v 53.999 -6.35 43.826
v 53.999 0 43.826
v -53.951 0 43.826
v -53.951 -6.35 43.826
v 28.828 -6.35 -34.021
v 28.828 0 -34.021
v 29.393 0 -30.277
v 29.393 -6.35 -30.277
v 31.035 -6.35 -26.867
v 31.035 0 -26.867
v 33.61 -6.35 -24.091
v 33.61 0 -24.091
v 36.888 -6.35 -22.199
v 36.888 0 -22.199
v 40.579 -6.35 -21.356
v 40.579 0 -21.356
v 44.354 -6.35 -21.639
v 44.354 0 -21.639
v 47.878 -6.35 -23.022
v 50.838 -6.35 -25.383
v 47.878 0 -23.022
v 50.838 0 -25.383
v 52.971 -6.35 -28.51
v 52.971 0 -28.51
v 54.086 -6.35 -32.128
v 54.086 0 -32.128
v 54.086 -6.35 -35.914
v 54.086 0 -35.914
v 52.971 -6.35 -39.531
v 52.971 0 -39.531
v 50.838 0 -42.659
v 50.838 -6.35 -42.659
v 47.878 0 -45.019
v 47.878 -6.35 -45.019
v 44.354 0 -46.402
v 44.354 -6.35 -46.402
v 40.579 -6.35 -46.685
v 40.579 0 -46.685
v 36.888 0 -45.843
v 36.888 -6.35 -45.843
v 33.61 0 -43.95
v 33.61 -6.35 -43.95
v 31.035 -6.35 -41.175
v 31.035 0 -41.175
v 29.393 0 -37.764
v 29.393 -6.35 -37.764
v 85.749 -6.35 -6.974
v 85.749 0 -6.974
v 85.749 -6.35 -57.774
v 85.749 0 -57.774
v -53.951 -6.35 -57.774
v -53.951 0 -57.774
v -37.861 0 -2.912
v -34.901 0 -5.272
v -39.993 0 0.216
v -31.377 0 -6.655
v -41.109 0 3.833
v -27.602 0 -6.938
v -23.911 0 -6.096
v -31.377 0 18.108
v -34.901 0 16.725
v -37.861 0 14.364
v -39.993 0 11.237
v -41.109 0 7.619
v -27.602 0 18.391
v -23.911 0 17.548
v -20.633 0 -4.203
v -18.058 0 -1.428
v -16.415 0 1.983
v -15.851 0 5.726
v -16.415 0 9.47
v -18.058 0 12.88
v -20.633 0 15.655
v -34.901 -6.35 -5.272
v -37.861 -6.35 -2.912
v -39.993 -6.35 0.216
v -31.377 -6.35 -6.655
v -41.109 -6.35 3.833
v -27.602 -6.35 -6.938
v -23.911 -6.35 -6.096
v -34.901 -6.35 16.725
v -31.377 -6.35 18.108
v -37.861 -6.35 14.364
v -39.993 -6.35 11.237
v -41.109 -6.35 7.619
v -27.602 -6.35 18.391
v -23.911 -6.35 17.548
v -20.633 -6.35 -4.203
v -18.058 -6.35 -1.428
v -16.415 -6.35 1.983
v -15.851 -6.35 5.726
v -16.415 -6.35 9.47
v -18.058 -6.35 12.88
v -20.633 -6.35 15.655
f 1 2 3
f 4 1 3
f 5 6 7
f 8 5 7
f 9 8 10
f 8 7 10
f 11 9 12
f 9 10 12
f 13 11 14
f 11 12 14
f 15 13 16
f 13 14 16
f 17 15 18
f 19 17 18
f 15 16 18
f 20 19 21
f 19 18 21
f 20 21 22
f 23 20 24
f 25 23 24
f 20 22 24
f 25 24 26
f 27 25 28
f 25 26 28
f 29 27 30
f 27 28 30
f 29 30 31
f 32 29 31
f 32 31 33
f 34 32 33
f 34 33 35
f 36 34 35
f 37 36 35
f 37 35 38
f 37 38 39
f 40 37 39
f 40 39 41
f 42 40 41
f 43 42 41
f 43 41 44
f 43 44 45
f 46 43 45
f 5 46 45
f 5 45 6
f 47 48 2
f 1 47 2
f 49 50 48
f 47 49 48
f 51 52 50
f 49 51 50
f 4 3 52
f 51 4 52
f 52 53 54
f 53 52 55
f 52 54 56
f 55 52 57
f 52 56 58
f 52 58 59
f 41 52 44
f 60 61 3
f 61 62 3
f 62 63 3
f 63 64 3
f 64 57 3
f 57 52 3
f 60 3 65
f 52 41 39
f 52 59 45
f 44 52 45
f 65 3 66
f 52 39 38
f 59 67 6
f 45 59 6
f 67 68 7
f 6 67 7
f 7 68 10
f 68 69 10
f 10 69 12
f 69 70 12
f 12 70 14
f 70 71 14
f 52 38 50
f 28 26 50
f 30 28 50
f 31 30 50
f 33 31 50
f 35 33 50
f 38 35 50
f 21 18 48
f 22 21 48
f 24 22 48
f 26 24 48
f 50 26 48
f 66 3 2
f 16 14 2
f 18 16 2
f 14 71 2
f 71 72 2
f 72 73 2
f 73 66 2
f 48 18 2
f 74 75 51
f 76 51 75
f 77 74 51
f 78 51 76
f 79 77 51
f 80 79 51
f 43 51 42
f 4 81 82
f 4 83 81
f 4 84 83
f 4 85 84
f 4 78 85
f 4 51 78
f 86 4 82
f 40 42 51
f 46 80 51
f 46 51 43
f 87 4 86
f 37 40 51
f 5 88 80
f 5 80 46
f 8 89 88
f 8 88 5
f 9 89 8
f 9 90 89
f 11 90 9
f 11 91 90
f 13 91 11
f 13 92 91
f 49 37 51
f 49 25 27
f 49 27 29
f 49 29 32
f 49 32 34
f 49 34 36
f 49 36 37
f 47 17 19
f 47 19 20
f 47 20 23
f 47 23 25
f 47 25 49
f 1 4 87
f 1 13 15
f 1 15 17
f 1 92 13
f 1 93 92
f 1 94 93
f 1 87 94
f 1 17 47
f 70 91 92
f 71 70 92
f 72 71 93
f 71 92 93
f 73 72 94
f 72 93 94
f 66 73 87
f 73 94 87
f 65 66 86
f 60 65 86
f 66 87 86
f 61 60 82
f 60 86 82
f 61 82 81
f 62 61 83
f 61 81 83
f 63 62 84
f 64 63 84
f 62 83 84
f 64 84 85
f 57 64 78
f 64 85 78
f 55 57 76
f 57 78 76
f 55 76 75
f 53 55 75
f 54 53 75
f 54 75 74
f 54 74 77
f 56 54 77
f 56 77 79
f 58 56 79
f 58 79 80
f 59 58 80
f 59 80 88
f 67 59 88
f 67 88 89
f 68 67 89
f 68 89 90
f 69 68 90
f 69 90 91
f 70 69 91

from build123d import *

# Parameters (mm, degrees)
F1_DEPTH = 6.35
F2_R     = 12.7
F3_DEPTH = 6.351
F5_D     = 25.4


with BuildPart() as f1:
    # F0 (on Front) → F1 (new body)
    with BuildSketch(Plane.XZ):
        Polygon((53.999179, 43.826219), (-53.950821, 43.826219), (-53.950821, -57.773781), (85.749179, -57.773781), (85.749179, -6.973781), align=None)
    extrude(amount=F1_DEPTH)

    # F2 (on face) → F3 (cut, through all)
    with BuildSketch(Plane.XZ.offset(6.35)):
        with Locations((-28.550821, 5.726219)):
            Circle(F2_R)
    extrude(amount=-F3_DEPTH, mode=Mode.SUBTRACT)

    # F5 (through all)
    with Locations(Plane.XZ.offset(6.35)):
        with Locations((41.528299, -34.020744)):
            Hole(F5_D / 2)


solid = f1.part
